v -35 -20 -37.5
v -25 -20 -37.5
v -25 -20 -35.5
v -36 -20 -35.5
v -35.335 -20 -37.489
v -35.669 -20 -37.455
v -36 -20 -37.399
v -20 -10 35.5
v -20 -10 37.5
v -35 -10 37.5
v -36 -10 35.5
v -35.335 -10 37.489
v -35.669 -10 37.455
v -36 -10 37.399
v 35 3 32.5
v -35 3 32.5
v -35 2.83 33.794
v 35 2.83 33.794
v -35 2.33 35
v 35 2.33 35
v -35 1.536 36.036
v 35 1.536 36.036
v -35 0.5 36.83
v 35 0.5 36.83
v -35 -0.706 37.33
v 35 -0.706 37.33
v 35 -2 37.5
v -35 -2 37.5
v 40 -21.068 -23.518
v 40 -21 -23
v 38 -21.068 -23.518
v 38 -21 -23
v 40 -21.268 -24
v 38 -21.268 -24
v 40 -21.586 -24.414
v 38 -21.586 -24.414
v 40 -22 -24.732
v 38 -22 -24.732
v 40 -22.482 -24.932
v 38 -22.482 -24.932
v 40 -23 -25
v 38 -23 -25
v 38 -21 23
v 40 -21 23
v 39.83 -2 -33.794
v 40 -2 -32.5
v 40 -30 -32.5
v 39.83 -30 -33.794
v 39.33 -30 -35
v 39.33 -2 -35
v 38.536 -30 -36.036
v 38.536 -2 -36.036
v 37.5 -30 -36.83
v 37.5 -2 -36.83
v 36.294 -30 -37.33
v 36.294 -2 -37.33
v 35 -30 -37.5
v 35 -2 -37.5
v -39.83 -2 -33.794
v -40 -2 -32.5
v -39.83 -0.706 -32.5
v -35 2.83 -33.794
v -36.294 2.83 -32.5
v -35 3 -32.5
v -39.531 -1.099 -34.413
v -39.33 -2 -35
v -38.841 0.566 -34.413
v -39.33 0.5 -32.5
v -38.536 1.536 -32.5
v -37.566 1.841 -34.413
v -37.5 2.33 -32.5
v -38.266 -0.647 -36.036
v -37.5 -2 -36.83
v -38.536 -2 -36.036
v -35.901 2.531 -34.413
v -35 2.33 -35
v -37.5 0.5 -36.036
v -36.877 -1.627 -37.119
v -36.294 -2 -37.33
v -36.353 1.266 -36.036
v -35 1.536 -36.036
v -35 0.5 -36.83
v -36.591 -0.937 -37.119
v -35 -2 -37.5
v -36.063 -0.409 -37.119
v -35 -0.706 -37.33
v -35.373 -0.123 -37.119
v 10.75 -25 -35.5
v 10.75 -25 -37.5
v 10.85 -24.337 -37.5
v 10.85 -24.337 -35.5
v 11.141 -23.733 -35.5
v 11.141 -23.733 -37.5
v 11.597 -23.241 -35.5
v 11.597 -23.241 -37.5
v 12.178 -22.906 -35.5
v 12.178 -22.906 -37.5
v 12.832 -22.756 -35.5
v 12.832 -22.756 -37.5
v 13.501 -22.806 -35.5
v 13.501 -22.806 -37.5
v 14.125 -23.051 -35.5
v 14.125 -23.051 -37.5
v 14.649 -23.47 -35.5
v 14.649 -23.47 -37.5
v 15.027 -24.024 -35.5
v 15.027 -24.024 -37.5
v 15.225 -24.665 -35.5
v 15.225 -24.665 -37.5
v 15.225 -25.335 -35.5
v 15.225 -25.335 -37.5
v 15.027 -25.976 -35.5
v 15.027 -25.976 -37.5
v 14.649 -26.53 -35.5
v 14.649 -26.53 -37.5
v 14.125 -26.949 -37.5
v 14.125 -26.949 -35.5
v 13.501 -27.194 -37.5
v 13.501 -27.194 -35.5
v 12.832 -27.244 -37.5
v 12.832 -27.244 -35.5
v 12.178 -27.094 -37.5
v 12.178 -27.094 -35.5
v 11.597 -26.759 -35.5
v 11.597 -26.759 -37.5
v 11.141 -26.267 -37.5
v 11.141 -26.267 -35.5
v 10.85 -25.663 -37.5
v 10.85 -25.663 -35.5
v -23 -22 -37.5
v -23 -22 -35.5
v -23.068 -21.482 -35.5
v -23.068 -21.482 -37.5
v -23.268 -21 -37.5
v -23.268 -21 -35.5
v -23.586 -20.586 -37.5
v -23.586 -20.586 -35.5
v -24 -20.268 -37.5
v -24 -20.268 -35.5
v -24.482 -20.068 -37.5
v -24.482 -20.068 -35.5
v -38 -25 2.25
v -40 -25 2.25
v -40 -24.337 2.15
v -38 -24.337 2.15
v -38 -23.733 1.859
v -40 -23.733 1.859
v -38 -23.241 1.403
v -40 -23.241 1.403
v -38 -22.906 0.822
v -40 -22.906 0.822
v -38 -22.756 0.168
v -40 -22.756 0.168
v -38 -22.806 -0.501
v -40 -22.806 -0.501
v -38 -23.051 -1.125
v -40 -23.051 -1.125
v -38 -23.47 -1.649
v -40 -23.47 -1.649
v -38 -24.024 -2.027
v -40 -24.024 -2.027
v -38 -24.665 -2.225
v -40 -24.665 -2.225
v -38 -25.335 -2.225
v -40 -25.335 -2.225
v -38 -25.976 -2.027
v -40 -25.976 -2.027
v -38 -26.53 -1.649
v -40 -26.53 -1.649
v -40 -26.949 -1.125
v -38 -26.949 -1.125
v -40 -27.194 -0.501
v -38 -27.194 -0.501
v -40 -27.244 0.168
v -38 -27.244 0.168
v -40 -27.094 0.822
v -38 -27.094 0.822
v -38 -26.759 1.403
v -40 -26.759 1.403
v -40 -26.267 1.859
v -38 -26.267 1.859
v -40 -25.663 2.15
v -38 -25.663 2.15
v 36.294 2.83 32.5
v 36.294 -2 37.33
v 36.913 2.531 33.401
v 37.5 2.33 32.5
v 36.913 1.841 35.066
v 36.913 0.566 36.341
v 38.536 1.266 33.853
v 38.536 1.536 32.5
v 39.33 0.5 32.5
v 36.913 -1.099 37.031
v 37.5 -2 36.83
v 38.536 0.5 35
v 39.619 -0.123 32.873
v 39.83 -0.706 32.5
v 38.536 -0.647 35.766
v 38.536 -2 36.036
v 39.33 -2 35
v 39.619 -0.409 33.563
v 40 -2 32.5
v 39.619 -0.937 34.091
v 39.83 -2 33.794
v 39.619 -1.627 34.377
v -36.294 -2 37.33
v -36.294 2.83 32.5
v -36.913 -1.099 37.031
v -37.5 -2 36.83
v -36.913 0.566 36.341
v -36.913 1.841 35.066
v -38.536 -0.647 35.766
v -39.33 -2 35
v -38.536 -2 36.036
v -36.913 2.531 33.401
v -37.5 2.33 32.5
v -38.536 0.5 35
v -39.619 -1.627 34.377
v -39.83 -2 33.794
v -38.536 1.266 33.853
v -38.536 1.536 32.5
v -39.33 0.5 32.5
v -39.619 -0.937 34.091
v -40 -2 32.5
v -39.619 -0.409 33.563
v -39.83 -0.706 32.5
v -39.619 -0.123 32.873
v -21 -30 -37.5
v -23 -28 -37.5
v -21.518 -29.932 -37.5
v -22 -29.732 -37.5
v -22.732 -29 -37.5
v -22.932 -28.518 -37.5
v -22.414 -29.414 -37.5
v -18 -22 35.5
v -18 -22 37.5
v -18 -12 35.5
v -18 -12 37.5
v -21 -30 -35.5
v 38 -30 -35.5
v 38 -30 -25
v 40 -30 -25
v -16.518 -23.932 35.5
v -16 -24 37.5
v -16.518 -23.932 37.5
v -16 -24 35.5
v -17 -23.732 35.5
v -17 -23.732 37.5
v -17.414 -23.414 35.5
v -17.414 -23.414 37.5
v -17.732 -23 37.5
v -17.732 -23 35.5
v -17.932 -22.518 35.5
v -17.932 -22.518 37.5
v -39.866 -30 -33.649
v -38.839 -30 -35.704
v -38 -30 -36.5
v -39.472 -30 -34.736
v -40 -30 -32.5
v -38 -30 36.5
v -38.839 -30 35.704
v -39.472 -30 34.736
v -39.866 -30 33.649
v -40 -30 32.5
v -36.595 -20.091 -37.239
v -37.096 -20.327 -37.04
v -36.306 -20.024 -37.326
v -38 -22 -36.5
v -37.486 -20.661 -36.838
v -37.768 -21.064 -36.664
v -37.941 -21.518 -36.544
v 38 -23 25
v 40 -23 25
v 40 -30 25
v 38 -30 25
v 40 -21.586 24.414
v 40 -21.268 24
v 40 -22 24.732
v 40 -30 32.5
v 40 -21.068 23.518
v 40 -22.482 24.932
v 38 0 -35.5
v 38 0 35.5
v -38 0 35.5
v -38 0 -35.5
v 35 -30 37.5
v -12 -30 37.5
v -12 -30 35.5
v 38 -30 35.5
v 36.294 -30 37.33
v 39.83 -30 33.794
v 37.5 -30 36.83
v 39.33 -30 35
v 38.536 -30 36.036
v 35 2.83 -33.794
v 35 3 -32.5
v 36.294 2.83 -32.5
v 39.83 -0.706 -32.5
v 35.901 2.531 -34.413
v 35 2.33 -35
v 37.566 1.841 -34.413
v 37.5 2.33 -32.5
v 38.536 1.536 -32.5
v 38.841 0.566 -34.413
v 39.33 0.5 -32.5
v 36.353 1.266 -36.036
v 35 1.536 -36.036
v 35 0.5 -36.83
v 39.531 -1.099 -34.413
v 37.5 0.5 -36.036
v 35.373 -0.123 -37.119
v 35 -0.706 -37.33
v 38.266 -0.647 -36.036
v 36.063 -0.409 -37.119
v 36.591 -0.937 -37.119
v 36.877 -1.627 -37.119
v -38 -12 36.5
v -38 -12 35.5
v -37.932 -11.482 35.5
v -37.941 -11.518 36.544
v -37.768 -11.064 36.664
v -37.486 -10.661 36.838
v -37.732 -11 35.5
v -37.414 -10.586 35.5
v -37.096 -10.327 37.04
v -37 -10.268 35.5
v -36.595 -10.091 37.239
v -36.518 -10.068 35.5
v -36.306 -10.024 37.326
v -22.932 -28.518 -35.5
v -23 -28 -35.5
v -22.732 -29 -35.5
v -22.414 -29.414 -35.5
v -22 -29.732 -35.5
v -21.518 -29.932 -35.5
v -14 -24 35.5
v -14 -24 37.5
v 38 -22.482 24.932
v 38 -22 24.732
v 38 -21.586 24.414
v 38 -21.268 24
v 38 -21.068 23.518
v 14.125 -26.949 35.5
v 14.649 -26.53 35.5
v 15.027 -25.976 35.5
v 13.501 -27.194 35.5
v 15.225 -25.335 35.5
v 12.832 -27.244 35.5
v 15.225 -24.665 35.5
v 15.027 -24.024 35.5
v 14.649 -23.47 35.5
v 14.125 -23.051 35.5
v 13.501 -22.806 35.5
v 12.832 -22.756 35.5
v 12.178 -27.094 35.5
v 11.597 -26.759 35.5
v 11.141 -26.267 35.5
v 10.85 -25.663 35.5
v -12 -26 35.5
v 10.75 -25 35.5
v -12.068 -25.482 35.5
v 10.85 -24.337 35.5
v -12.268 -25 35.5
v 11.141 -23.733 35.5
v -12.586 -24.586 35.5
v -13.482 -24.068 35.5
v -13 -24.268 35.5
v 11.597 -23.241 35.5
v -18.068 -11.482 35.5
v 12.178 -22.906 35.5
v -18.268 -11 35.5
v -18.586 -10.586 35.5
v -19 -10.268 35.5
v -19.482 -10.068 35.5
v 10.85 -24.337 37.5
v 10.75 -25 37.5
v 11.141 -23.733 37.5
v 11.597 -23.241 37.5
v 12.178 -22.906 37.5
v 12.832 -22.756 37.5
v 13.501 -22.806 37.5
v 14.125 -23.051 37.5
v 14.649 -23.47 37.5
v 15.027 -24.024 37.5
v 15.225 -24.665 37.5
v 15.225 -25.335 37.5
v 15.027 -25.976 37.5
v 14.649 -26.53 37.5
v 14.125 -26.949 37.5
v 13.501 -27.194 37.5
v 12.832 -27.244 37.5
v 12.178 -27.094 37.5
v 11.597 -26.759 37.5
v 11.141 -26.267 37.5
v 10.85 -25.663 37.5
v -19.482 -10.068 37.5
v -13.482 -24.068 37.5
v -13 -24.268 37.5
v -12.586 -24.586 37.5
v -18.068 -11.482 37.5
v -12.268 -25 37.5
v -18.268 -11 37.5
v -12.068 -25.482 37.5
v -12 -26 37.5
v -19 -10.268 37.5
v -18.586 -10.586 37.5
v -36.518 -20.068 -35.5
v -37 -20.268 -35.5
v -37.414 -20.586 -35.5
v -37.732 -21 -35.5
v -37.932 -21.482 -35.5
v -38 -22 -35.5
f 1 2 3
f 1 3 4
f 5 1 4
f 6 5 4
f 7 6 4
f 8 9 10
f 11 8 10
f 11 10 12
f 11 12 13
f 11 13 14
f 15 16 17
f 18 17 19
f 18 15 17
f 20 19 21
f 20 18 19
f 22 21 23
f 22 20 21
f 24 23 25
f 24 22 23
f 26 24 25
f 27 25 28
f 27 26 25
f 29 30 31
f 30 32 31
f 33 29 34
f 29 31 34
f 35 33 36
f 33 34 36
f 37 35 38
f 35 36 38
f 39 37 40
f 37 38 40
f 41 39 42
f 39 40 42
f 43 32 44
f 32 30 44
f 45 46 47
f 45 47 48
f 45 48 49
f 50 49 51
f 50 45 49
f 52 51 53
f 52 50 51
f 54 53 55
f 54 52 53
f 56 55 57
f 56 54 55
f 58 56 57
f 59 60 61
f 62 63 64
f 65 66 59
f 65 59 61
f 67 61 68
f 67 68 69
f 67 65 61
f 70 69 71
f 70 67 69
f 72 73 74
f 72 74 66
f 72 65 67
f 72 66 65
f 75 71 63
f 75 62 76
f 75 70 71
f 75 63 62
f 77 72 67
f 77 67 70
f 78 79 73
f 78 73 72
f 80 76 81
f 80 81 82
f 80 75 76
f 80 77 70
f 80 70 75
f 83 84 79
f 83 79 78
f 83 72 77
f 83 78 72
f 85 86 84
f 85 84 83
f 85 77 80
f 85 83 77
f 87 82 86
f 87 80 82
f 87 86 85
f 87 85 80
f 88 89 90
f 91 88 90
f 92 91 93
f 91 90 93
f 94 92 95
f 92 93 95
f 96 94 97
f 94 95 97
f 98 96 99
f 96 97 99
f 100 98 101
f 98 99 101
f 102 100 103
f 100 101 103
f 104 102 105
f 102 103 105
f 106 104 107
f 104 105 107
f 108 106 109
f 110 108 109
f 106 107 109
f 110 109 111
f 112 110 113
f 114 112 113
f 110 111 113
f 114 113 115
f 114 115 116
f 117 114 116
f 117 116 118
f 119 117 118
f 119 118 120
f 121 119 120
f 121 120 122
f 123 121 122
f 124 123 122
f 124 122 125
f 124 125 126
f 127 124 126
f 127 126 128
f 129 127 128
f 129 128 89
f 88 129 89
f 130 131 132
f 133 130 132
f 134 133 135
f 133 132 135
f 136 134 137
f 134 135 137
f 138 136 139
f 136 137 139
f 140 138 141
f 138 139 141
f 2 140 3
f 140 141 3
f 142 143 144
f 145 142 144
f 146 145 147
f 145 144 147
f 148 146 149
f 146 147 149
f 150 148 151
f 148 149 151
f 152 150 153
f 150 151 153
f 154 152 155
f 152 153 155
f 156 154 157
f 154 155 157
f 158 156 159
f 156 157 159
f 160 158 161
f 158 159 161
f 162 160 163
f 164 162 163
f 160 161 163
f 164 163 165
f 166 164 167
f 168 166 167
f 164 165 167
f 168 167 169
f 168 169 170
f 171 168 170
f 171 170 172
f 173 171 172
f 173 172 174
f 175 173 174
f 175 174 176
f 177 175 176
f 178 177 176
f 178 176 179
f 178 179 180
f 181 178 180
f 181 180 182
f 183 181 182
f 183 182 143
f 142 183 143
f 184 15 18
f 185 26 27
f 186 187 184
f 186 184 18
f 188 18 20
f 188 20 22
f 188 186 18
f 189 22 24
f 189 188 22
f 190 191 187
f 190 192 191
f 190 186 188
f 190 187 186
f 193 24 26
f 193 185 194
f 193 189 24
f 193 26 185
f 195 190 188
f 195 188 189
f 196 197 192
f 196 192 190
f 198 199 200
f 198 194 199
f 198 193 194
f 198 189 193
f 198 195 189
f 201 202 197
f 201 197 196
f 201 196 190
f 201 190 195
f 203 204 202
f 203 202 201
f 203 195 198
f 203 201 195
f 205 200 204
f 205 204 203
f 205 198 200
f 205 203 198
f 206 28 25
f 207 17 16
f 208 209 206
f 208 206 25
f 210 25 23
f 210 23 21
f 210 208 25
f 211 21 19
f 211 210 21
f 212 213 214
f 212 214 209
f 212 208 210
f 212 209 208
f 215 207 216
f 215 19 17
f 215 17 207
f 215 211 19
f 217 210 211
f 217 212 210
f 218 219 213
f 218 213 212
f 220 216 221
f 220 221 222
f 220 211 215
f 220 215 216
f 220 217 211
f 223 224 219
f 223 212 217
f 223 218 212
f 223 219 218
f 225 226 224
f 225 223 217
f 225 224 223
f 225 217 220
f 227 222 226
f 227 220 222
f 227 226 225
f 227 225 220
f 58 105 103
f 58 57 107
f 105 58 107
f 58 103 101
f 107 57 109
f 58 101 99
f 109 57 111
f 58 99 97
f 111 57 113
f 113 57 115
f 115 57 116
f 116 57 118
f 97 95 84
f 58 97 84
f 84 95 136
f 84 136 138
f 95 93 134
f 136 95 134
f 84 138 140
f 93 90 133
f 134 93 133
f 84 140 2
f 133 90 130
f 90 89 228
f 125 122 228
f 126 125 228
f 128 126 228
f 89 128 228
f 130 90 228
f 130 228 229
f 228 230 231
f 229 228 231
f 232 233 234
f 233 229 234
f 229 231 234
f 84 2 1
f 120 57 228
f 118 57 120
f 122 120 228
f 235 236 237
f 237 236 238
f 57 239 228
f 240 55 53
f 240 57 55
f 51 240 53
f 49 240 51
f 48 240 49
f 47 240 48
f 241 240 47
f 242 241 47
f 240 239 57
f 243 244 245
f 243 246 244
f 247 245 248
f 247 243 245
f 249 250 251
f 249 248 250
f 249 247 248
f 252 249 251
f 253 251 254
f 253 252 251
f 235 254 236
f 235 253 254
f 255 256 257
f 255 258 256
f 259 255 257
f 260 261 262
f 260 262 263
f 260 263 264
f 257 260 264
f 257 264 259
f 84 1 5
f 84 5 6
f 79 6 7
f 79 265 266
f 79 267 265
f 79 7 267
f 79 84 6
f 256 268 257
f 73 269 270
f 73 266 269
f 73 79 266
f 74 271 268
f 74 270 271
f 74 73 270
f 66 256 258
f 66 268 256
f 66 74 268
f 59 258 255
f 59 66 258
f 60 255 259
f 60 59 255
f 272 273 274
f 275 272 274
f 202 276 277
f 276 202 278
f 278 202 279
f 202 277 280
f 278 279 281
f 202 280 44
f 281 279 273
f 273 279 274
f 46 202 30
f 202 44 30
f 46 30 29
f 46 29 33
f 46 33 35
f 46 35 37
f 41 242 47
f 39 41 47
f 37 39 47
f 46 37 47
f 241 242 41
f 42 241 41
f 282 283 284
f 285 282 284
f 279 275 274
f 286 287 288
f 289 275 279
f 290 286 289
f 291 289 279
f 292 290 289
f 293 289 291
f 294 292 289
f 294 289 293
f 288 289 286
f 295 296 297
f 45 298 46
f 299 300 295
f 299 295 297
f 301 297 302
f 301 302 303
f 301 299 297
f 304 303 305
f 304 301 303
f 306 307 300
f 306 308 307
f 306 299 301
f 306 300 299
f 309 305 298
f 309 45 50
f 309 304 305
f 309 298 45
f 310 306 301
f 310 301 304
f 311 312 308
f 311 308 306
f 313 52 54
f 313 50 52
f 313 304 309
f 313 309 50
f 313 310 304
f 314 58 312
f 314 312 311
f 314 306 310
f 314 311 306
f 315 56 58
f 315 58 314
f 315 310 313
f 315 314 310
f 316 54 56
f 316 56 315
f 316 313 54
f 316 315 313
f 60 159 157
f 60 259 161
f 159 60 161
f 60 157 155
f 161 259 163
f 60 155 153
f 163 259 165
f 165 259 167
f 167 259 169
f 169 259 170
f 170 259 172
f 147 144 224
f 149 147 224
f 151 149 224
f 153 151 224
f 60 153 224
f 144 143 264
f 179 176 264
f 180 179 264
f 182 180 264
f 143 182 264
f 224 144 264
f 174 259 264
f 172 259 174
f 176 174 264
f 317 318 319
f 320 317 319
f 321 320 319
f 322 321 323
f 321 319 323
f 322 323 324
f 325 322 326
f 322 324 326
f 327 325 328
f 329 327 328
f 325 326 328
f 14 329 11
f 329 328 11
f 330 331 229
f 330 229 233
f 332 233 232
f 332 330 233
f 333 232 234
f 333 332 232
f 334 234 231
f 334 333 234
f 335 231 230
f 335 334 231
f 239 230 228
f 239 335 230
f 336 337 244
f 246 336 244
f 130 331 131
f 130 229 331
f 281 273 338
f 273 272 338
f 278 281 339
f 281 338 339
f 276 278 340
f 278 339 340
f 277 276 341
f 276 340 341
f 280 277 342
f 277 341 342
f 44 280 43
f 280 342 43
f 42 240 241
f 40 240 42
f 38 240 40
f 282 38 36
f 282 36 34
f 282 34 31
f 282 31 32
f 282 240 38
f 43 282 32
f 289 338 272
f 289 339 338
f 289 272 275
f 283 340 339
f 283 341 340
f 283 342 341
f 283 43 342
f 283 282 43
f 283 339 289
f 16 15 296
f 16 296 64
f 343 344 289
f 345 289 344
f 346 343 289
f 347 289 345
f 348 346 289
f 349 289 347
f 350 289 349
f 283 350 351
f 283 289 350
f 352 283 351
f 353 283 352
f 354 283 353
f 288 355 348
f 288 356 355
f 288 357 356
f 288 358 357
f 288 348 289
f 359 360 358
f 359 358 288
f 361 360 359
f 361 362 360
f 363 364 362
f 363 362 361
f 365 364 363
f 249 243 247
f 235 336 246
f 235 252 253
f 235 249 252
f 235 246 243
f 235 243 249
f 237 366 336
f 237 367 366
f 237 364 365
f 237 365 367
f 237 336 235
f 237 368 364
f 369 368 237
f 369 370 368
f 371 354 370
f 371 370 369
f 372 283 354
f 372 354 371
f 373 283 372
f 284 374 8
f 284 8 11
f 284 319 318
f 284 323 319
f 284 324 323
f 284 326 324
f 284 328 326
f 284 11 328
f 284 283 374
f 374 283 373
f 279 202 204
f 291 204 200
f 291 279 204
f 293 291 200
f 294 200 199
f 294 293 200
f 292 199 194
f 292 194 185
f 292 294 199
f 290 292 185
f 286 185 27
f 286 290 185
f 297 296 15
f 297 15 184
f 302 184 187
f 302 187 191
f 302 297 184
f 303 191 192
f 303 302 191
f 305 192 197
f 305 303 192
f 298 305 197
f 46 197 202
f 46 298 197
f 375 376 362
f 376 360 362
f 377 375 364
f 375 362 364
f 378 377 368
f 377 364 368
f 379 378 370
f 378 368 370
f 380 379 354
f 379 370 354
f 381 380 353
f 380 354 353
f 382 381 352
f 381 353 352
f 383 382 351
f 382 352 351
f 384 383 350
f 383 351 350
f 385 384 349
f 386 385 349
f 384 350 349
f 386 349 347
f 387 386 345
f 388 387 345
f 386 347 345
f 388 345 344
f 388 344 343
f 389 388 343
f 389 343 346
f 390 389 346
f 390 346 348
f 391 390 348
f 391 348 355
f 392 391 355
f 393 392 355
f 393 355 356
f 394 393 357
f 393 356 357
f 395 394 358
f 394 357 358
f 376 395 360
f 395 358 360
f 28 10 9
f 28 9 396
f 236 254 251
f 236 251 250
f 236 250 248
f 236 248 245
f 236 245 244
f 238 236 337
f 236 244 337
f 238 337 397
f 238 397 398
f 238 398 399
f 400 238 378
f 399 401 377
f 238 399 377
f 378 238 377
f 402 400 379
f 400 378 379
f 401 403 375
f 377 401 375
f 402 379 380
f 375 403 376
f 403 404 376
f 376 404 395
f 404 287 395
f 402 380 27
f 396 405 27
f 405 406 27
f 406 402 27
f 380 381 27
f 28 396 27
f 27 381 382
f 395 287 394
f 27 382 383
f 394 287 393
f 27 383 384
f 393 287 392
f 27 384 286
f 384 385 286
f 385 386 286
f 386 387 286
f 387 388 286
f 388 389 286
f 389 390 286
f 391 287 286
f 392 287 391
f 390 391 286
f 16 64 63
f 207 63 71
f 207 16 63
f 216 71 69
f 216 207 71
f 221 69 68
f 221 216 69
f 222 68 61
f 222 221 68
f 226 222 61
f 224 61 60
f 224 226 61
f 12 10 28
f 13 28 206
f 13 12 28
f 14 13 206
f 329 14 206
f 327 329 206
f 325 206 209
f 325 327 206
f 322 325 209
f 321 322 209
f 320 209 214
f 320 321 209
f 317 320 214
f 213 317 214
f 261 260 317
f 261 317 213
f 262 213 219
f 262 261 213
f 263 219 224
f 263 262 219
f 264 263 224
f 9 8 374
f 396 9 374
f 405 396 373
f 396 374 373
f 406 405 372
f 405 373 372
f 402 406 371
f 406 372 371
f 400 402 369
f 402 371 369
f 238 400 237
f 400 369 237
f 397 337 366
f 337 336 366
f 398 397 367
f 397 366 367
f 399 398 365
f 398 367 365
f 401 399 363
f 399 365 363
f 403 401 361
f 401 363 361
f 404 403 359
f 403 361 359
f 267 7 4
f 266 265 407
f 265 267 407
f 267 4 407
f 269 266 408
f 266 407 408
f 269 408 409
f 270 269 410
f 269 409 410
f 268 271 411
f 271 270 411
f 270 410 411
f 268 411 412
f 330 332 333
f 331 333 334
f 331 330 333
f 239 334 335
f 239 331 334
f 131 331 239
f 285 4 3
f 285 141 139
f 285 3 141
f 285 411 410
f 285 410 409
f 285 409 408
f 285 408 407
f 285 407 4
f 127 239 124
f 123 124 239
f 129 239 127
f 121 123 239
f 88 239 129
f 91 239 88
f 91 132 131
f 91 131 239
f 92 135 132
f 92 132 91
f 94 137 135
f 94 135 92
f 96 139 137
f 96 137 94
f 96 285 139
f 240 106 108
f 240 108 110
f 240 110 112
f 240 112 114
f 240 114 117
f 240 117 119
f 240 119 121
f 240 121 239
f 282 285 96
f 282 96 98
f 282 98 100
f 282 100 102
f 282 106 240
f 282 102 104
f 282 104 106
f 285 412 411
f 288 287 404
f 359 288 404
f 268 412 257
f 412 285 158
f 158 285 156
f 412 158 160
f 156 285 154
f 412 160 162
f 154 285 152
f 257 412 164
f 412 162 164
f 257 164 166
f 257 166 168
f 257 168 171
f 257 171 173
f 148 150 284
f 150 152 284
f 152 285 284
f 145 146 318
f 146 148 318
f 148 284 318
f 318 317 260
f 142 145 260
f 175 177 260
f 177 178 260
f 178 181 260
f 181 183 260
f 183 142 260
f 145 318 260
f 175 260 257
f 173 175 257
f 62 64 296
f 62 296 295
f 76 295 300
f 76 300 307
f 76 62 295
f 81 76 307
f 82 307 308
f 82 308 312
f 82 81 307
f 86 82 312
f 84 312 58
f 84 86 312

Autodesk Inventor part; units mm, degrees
ref_plane "YZ Plane" through (0, 0, 0) normal (1, 0, 0) x (0, 1, 0)
ref_plane "XZ Plane" through (0, 0, 0) normal (0, 1, 0) x (-1, 0, 0)
ref_plane "XY Plane" through (0, 0, 0) normal (0, 0, 1) x (1, 0, 0)
sketch "Sketch1" plane through (0, 0, 0) normal (0, 1, 0) x (-1, 0, 0)
  line L0 (40, 37.5) -> (-40, 37.5)
  line L1 (-40, 37.5) -> (-40, -37.5)
  line L2 (-40, -37.5) -> (40, -37.5)
  line L3 (40, -37.5) -> (40, 37.5)
  line L4 (40, 37.5) -> (-40, -37.5) construction
  line L5 (-40, 37.5) -> (40, -37.5) construction
  point P0 (0, 0)
  dimension "d0" = 80
  dimension "d1" = 75
extrude "Extrusion1" add sketch "Sketch1" along normal blind 3
sketch "Sketch2" plane through (0, 0, 0) normal (0, -1, 0) x (1, 0, 0)
  line L0 (-38, -35.5) -> (38, -35.5)
  line L1 (38, -35.5) -> (38, 35.5)
  line L2 (38, 35.5) -> (-38, 35.5)
  line L3 (-38, 35.5) -> (-38, -35.5)
  line L4 (-38, -35.5) -> (38, 35.5) construction
  line L5 (38, -35.5) -> (-38, 35.5) construction
  line L6 (-40, -37.5) -> (-40, 37.5) projected
  line L7 (-40, 37.5) -> (40, 37.5) projected
  line L8 (-40, -37.5) -> (40, -37.5)
  line L9 (40, -37.5) -> (40, 37.5)
  line L10 (40, 37.5) -> (-40, 37.5)
  line L11 (-40, 37.5) -> (-40, -37.5)
  line L12 (-40, -37.5) -> (40, 37.5) construction
  line L13 (40, -37.5) -> (-40, 37.5) construction
  point P0 (0, 0)
  dimension "d4" = 2
  dimension "d5" = 2
extrude "Extrusion2" add sketch "Sketch2" along normal blind 30
sketch "Sketch3" plane through (40, 3, 37.5) normal (1, 0, 0) x (0, 0, -1)
  line L0 (73, -33) -> (2, -33) projected
  line L1 (12.5, -33) -> (62.5, -33)
  line L2 (62.5, -33) -> (62.5, -24)
  line L3 (62.5, -24) -> (12.5, -24)
  line L4 (12.5, -24) -> (12.5, -33)
  line L5 (75, -33) -> (75, 0) projected
  point P0 (37.5, -3)
  dimension "d8" = 50
  dimension "d9" = 9
  dimension "d10" = 12.5
extrude "Extrusion3" cut sketch "Sketch3" against normal up to surface (2 mm away)
sketch "Sketch4" plane through (-40, 3, 37.5) normal (0, 0, 1) x (1, 0, 0)
  line L0 (78, -33) -> (2, -33) projected
  line L1 (2, -33) -> (22, -33)
  line L2 (22, -33) -> (22, -13)
  line L3 (22, -13) -> (2, -13)
  line L4 (2, -13) -> (2, -33)
  line L5 (0, -33) -> (0, 0) projected
  line L6 (22, -33) -> (28, -33)
  line L7 (28, -33) -> (28, -27)
  line L8 (28, -27) -> (22, -27)
  line L9 (22, -27) -> (22, -33)
  point P0 (40, -3)
  point P1 (22, -27)
  dimension "d13" = 20
  dimension "d14" = 20
  dimension "d15" = 2
  dimension "d16" = 6
  dimension "d17" = 6
extrude "Extrusion4" cut sketch "Sketch4" against normal up to surface (2 mm away)
fillet "Fillet1" radius 2 4 edges at (-38, -10, 36.5) (-18, -10, 36.5) (-12, -24, 36.5) (-18, -24, 36.5)
fillet "Fillet2" radius 2 2 edges at (39, -21, 25) (39, -21, -25)
sketch "Sketch5" plane through (40, 3, -37.5) normal (0, 0, -1) x (-1, 0, 0)
  line L0 (2, -33) -> (78, -33) projected
  line L1 (78, -33) -> (63, -33)
  line L2 (63, -33) -> (63, -23)
  line L3 (63, -23) -> (78, -23)
  line L4 (78, -23) -> (78, -33)
  line L5 (80, -33) -> (80, 0) projected
  point P0 (40, -3)
  point P1 (78, -28)
  dimension "d22" = 15
  dimension "d23" = 10
  dimension "d24" = 2
extrude "Extrusion5" cut sketch "Sketch5" against normal up to surface (2 mm away)
fillet "Fillet3" radius 2 3 edges at (-38, -20, -36.5) (-23, -20, -36.5) (-23, -30, -36.5)
sketch "Sketch6" plane through (40, 3, -37.5) normal (0, 0, -1) x (-1, 0, 0)
  circle A0 centre (27, -28) radius 2.25
  line L0 (61, -33) -> (0, -33) projected
  line L1 (0, -33) -> (0, 0) projected
  point P0 (40, -3)
  dimension "d28" = 4.5
  dimension "d29" = 5
  dimension "d30" = 27
extrude "Extrusion6" cut sketch "Sketch6" against normal through all
sketch "Sketch7" plane through (-40, 3, -37.5) normal (-1, 0, 0) x (0, 0, 1)
  circle A0 centre (37.5, -28) radius 2.25
  line L0 (75, -33) -> (0, -33) projected
  line L1 (75, -33) -> (75, 0) projected
  point P0 (37.5, -3)
  dimension "d33" = 4.5
  dimension "d34" = 5
  dimension "d35" = 37.5
extrude "Extrusion7" cut sketch "Sketch7" against normal up to surface (2 mm away)
fillet "Fillet4" radius 5 4 edges at (-40, 3, 0) (0, 3, 37.5) (0, 3, -37.5) (40, 3, 0)
fillet "Fillet5" radius 5 8 edges at (38.5355, 1.5355, -36.0355) (40, -16, -37.5) (-38.5355, 1.5355, -36.0355) (-40, -16, -37.5) (-38.5355, 1.5355, 36.0355) (-40, -16, 37.5) (38.5355, 1.5355, 36.0355) (40, -16, 37.5)
properties part number "cable_box"
